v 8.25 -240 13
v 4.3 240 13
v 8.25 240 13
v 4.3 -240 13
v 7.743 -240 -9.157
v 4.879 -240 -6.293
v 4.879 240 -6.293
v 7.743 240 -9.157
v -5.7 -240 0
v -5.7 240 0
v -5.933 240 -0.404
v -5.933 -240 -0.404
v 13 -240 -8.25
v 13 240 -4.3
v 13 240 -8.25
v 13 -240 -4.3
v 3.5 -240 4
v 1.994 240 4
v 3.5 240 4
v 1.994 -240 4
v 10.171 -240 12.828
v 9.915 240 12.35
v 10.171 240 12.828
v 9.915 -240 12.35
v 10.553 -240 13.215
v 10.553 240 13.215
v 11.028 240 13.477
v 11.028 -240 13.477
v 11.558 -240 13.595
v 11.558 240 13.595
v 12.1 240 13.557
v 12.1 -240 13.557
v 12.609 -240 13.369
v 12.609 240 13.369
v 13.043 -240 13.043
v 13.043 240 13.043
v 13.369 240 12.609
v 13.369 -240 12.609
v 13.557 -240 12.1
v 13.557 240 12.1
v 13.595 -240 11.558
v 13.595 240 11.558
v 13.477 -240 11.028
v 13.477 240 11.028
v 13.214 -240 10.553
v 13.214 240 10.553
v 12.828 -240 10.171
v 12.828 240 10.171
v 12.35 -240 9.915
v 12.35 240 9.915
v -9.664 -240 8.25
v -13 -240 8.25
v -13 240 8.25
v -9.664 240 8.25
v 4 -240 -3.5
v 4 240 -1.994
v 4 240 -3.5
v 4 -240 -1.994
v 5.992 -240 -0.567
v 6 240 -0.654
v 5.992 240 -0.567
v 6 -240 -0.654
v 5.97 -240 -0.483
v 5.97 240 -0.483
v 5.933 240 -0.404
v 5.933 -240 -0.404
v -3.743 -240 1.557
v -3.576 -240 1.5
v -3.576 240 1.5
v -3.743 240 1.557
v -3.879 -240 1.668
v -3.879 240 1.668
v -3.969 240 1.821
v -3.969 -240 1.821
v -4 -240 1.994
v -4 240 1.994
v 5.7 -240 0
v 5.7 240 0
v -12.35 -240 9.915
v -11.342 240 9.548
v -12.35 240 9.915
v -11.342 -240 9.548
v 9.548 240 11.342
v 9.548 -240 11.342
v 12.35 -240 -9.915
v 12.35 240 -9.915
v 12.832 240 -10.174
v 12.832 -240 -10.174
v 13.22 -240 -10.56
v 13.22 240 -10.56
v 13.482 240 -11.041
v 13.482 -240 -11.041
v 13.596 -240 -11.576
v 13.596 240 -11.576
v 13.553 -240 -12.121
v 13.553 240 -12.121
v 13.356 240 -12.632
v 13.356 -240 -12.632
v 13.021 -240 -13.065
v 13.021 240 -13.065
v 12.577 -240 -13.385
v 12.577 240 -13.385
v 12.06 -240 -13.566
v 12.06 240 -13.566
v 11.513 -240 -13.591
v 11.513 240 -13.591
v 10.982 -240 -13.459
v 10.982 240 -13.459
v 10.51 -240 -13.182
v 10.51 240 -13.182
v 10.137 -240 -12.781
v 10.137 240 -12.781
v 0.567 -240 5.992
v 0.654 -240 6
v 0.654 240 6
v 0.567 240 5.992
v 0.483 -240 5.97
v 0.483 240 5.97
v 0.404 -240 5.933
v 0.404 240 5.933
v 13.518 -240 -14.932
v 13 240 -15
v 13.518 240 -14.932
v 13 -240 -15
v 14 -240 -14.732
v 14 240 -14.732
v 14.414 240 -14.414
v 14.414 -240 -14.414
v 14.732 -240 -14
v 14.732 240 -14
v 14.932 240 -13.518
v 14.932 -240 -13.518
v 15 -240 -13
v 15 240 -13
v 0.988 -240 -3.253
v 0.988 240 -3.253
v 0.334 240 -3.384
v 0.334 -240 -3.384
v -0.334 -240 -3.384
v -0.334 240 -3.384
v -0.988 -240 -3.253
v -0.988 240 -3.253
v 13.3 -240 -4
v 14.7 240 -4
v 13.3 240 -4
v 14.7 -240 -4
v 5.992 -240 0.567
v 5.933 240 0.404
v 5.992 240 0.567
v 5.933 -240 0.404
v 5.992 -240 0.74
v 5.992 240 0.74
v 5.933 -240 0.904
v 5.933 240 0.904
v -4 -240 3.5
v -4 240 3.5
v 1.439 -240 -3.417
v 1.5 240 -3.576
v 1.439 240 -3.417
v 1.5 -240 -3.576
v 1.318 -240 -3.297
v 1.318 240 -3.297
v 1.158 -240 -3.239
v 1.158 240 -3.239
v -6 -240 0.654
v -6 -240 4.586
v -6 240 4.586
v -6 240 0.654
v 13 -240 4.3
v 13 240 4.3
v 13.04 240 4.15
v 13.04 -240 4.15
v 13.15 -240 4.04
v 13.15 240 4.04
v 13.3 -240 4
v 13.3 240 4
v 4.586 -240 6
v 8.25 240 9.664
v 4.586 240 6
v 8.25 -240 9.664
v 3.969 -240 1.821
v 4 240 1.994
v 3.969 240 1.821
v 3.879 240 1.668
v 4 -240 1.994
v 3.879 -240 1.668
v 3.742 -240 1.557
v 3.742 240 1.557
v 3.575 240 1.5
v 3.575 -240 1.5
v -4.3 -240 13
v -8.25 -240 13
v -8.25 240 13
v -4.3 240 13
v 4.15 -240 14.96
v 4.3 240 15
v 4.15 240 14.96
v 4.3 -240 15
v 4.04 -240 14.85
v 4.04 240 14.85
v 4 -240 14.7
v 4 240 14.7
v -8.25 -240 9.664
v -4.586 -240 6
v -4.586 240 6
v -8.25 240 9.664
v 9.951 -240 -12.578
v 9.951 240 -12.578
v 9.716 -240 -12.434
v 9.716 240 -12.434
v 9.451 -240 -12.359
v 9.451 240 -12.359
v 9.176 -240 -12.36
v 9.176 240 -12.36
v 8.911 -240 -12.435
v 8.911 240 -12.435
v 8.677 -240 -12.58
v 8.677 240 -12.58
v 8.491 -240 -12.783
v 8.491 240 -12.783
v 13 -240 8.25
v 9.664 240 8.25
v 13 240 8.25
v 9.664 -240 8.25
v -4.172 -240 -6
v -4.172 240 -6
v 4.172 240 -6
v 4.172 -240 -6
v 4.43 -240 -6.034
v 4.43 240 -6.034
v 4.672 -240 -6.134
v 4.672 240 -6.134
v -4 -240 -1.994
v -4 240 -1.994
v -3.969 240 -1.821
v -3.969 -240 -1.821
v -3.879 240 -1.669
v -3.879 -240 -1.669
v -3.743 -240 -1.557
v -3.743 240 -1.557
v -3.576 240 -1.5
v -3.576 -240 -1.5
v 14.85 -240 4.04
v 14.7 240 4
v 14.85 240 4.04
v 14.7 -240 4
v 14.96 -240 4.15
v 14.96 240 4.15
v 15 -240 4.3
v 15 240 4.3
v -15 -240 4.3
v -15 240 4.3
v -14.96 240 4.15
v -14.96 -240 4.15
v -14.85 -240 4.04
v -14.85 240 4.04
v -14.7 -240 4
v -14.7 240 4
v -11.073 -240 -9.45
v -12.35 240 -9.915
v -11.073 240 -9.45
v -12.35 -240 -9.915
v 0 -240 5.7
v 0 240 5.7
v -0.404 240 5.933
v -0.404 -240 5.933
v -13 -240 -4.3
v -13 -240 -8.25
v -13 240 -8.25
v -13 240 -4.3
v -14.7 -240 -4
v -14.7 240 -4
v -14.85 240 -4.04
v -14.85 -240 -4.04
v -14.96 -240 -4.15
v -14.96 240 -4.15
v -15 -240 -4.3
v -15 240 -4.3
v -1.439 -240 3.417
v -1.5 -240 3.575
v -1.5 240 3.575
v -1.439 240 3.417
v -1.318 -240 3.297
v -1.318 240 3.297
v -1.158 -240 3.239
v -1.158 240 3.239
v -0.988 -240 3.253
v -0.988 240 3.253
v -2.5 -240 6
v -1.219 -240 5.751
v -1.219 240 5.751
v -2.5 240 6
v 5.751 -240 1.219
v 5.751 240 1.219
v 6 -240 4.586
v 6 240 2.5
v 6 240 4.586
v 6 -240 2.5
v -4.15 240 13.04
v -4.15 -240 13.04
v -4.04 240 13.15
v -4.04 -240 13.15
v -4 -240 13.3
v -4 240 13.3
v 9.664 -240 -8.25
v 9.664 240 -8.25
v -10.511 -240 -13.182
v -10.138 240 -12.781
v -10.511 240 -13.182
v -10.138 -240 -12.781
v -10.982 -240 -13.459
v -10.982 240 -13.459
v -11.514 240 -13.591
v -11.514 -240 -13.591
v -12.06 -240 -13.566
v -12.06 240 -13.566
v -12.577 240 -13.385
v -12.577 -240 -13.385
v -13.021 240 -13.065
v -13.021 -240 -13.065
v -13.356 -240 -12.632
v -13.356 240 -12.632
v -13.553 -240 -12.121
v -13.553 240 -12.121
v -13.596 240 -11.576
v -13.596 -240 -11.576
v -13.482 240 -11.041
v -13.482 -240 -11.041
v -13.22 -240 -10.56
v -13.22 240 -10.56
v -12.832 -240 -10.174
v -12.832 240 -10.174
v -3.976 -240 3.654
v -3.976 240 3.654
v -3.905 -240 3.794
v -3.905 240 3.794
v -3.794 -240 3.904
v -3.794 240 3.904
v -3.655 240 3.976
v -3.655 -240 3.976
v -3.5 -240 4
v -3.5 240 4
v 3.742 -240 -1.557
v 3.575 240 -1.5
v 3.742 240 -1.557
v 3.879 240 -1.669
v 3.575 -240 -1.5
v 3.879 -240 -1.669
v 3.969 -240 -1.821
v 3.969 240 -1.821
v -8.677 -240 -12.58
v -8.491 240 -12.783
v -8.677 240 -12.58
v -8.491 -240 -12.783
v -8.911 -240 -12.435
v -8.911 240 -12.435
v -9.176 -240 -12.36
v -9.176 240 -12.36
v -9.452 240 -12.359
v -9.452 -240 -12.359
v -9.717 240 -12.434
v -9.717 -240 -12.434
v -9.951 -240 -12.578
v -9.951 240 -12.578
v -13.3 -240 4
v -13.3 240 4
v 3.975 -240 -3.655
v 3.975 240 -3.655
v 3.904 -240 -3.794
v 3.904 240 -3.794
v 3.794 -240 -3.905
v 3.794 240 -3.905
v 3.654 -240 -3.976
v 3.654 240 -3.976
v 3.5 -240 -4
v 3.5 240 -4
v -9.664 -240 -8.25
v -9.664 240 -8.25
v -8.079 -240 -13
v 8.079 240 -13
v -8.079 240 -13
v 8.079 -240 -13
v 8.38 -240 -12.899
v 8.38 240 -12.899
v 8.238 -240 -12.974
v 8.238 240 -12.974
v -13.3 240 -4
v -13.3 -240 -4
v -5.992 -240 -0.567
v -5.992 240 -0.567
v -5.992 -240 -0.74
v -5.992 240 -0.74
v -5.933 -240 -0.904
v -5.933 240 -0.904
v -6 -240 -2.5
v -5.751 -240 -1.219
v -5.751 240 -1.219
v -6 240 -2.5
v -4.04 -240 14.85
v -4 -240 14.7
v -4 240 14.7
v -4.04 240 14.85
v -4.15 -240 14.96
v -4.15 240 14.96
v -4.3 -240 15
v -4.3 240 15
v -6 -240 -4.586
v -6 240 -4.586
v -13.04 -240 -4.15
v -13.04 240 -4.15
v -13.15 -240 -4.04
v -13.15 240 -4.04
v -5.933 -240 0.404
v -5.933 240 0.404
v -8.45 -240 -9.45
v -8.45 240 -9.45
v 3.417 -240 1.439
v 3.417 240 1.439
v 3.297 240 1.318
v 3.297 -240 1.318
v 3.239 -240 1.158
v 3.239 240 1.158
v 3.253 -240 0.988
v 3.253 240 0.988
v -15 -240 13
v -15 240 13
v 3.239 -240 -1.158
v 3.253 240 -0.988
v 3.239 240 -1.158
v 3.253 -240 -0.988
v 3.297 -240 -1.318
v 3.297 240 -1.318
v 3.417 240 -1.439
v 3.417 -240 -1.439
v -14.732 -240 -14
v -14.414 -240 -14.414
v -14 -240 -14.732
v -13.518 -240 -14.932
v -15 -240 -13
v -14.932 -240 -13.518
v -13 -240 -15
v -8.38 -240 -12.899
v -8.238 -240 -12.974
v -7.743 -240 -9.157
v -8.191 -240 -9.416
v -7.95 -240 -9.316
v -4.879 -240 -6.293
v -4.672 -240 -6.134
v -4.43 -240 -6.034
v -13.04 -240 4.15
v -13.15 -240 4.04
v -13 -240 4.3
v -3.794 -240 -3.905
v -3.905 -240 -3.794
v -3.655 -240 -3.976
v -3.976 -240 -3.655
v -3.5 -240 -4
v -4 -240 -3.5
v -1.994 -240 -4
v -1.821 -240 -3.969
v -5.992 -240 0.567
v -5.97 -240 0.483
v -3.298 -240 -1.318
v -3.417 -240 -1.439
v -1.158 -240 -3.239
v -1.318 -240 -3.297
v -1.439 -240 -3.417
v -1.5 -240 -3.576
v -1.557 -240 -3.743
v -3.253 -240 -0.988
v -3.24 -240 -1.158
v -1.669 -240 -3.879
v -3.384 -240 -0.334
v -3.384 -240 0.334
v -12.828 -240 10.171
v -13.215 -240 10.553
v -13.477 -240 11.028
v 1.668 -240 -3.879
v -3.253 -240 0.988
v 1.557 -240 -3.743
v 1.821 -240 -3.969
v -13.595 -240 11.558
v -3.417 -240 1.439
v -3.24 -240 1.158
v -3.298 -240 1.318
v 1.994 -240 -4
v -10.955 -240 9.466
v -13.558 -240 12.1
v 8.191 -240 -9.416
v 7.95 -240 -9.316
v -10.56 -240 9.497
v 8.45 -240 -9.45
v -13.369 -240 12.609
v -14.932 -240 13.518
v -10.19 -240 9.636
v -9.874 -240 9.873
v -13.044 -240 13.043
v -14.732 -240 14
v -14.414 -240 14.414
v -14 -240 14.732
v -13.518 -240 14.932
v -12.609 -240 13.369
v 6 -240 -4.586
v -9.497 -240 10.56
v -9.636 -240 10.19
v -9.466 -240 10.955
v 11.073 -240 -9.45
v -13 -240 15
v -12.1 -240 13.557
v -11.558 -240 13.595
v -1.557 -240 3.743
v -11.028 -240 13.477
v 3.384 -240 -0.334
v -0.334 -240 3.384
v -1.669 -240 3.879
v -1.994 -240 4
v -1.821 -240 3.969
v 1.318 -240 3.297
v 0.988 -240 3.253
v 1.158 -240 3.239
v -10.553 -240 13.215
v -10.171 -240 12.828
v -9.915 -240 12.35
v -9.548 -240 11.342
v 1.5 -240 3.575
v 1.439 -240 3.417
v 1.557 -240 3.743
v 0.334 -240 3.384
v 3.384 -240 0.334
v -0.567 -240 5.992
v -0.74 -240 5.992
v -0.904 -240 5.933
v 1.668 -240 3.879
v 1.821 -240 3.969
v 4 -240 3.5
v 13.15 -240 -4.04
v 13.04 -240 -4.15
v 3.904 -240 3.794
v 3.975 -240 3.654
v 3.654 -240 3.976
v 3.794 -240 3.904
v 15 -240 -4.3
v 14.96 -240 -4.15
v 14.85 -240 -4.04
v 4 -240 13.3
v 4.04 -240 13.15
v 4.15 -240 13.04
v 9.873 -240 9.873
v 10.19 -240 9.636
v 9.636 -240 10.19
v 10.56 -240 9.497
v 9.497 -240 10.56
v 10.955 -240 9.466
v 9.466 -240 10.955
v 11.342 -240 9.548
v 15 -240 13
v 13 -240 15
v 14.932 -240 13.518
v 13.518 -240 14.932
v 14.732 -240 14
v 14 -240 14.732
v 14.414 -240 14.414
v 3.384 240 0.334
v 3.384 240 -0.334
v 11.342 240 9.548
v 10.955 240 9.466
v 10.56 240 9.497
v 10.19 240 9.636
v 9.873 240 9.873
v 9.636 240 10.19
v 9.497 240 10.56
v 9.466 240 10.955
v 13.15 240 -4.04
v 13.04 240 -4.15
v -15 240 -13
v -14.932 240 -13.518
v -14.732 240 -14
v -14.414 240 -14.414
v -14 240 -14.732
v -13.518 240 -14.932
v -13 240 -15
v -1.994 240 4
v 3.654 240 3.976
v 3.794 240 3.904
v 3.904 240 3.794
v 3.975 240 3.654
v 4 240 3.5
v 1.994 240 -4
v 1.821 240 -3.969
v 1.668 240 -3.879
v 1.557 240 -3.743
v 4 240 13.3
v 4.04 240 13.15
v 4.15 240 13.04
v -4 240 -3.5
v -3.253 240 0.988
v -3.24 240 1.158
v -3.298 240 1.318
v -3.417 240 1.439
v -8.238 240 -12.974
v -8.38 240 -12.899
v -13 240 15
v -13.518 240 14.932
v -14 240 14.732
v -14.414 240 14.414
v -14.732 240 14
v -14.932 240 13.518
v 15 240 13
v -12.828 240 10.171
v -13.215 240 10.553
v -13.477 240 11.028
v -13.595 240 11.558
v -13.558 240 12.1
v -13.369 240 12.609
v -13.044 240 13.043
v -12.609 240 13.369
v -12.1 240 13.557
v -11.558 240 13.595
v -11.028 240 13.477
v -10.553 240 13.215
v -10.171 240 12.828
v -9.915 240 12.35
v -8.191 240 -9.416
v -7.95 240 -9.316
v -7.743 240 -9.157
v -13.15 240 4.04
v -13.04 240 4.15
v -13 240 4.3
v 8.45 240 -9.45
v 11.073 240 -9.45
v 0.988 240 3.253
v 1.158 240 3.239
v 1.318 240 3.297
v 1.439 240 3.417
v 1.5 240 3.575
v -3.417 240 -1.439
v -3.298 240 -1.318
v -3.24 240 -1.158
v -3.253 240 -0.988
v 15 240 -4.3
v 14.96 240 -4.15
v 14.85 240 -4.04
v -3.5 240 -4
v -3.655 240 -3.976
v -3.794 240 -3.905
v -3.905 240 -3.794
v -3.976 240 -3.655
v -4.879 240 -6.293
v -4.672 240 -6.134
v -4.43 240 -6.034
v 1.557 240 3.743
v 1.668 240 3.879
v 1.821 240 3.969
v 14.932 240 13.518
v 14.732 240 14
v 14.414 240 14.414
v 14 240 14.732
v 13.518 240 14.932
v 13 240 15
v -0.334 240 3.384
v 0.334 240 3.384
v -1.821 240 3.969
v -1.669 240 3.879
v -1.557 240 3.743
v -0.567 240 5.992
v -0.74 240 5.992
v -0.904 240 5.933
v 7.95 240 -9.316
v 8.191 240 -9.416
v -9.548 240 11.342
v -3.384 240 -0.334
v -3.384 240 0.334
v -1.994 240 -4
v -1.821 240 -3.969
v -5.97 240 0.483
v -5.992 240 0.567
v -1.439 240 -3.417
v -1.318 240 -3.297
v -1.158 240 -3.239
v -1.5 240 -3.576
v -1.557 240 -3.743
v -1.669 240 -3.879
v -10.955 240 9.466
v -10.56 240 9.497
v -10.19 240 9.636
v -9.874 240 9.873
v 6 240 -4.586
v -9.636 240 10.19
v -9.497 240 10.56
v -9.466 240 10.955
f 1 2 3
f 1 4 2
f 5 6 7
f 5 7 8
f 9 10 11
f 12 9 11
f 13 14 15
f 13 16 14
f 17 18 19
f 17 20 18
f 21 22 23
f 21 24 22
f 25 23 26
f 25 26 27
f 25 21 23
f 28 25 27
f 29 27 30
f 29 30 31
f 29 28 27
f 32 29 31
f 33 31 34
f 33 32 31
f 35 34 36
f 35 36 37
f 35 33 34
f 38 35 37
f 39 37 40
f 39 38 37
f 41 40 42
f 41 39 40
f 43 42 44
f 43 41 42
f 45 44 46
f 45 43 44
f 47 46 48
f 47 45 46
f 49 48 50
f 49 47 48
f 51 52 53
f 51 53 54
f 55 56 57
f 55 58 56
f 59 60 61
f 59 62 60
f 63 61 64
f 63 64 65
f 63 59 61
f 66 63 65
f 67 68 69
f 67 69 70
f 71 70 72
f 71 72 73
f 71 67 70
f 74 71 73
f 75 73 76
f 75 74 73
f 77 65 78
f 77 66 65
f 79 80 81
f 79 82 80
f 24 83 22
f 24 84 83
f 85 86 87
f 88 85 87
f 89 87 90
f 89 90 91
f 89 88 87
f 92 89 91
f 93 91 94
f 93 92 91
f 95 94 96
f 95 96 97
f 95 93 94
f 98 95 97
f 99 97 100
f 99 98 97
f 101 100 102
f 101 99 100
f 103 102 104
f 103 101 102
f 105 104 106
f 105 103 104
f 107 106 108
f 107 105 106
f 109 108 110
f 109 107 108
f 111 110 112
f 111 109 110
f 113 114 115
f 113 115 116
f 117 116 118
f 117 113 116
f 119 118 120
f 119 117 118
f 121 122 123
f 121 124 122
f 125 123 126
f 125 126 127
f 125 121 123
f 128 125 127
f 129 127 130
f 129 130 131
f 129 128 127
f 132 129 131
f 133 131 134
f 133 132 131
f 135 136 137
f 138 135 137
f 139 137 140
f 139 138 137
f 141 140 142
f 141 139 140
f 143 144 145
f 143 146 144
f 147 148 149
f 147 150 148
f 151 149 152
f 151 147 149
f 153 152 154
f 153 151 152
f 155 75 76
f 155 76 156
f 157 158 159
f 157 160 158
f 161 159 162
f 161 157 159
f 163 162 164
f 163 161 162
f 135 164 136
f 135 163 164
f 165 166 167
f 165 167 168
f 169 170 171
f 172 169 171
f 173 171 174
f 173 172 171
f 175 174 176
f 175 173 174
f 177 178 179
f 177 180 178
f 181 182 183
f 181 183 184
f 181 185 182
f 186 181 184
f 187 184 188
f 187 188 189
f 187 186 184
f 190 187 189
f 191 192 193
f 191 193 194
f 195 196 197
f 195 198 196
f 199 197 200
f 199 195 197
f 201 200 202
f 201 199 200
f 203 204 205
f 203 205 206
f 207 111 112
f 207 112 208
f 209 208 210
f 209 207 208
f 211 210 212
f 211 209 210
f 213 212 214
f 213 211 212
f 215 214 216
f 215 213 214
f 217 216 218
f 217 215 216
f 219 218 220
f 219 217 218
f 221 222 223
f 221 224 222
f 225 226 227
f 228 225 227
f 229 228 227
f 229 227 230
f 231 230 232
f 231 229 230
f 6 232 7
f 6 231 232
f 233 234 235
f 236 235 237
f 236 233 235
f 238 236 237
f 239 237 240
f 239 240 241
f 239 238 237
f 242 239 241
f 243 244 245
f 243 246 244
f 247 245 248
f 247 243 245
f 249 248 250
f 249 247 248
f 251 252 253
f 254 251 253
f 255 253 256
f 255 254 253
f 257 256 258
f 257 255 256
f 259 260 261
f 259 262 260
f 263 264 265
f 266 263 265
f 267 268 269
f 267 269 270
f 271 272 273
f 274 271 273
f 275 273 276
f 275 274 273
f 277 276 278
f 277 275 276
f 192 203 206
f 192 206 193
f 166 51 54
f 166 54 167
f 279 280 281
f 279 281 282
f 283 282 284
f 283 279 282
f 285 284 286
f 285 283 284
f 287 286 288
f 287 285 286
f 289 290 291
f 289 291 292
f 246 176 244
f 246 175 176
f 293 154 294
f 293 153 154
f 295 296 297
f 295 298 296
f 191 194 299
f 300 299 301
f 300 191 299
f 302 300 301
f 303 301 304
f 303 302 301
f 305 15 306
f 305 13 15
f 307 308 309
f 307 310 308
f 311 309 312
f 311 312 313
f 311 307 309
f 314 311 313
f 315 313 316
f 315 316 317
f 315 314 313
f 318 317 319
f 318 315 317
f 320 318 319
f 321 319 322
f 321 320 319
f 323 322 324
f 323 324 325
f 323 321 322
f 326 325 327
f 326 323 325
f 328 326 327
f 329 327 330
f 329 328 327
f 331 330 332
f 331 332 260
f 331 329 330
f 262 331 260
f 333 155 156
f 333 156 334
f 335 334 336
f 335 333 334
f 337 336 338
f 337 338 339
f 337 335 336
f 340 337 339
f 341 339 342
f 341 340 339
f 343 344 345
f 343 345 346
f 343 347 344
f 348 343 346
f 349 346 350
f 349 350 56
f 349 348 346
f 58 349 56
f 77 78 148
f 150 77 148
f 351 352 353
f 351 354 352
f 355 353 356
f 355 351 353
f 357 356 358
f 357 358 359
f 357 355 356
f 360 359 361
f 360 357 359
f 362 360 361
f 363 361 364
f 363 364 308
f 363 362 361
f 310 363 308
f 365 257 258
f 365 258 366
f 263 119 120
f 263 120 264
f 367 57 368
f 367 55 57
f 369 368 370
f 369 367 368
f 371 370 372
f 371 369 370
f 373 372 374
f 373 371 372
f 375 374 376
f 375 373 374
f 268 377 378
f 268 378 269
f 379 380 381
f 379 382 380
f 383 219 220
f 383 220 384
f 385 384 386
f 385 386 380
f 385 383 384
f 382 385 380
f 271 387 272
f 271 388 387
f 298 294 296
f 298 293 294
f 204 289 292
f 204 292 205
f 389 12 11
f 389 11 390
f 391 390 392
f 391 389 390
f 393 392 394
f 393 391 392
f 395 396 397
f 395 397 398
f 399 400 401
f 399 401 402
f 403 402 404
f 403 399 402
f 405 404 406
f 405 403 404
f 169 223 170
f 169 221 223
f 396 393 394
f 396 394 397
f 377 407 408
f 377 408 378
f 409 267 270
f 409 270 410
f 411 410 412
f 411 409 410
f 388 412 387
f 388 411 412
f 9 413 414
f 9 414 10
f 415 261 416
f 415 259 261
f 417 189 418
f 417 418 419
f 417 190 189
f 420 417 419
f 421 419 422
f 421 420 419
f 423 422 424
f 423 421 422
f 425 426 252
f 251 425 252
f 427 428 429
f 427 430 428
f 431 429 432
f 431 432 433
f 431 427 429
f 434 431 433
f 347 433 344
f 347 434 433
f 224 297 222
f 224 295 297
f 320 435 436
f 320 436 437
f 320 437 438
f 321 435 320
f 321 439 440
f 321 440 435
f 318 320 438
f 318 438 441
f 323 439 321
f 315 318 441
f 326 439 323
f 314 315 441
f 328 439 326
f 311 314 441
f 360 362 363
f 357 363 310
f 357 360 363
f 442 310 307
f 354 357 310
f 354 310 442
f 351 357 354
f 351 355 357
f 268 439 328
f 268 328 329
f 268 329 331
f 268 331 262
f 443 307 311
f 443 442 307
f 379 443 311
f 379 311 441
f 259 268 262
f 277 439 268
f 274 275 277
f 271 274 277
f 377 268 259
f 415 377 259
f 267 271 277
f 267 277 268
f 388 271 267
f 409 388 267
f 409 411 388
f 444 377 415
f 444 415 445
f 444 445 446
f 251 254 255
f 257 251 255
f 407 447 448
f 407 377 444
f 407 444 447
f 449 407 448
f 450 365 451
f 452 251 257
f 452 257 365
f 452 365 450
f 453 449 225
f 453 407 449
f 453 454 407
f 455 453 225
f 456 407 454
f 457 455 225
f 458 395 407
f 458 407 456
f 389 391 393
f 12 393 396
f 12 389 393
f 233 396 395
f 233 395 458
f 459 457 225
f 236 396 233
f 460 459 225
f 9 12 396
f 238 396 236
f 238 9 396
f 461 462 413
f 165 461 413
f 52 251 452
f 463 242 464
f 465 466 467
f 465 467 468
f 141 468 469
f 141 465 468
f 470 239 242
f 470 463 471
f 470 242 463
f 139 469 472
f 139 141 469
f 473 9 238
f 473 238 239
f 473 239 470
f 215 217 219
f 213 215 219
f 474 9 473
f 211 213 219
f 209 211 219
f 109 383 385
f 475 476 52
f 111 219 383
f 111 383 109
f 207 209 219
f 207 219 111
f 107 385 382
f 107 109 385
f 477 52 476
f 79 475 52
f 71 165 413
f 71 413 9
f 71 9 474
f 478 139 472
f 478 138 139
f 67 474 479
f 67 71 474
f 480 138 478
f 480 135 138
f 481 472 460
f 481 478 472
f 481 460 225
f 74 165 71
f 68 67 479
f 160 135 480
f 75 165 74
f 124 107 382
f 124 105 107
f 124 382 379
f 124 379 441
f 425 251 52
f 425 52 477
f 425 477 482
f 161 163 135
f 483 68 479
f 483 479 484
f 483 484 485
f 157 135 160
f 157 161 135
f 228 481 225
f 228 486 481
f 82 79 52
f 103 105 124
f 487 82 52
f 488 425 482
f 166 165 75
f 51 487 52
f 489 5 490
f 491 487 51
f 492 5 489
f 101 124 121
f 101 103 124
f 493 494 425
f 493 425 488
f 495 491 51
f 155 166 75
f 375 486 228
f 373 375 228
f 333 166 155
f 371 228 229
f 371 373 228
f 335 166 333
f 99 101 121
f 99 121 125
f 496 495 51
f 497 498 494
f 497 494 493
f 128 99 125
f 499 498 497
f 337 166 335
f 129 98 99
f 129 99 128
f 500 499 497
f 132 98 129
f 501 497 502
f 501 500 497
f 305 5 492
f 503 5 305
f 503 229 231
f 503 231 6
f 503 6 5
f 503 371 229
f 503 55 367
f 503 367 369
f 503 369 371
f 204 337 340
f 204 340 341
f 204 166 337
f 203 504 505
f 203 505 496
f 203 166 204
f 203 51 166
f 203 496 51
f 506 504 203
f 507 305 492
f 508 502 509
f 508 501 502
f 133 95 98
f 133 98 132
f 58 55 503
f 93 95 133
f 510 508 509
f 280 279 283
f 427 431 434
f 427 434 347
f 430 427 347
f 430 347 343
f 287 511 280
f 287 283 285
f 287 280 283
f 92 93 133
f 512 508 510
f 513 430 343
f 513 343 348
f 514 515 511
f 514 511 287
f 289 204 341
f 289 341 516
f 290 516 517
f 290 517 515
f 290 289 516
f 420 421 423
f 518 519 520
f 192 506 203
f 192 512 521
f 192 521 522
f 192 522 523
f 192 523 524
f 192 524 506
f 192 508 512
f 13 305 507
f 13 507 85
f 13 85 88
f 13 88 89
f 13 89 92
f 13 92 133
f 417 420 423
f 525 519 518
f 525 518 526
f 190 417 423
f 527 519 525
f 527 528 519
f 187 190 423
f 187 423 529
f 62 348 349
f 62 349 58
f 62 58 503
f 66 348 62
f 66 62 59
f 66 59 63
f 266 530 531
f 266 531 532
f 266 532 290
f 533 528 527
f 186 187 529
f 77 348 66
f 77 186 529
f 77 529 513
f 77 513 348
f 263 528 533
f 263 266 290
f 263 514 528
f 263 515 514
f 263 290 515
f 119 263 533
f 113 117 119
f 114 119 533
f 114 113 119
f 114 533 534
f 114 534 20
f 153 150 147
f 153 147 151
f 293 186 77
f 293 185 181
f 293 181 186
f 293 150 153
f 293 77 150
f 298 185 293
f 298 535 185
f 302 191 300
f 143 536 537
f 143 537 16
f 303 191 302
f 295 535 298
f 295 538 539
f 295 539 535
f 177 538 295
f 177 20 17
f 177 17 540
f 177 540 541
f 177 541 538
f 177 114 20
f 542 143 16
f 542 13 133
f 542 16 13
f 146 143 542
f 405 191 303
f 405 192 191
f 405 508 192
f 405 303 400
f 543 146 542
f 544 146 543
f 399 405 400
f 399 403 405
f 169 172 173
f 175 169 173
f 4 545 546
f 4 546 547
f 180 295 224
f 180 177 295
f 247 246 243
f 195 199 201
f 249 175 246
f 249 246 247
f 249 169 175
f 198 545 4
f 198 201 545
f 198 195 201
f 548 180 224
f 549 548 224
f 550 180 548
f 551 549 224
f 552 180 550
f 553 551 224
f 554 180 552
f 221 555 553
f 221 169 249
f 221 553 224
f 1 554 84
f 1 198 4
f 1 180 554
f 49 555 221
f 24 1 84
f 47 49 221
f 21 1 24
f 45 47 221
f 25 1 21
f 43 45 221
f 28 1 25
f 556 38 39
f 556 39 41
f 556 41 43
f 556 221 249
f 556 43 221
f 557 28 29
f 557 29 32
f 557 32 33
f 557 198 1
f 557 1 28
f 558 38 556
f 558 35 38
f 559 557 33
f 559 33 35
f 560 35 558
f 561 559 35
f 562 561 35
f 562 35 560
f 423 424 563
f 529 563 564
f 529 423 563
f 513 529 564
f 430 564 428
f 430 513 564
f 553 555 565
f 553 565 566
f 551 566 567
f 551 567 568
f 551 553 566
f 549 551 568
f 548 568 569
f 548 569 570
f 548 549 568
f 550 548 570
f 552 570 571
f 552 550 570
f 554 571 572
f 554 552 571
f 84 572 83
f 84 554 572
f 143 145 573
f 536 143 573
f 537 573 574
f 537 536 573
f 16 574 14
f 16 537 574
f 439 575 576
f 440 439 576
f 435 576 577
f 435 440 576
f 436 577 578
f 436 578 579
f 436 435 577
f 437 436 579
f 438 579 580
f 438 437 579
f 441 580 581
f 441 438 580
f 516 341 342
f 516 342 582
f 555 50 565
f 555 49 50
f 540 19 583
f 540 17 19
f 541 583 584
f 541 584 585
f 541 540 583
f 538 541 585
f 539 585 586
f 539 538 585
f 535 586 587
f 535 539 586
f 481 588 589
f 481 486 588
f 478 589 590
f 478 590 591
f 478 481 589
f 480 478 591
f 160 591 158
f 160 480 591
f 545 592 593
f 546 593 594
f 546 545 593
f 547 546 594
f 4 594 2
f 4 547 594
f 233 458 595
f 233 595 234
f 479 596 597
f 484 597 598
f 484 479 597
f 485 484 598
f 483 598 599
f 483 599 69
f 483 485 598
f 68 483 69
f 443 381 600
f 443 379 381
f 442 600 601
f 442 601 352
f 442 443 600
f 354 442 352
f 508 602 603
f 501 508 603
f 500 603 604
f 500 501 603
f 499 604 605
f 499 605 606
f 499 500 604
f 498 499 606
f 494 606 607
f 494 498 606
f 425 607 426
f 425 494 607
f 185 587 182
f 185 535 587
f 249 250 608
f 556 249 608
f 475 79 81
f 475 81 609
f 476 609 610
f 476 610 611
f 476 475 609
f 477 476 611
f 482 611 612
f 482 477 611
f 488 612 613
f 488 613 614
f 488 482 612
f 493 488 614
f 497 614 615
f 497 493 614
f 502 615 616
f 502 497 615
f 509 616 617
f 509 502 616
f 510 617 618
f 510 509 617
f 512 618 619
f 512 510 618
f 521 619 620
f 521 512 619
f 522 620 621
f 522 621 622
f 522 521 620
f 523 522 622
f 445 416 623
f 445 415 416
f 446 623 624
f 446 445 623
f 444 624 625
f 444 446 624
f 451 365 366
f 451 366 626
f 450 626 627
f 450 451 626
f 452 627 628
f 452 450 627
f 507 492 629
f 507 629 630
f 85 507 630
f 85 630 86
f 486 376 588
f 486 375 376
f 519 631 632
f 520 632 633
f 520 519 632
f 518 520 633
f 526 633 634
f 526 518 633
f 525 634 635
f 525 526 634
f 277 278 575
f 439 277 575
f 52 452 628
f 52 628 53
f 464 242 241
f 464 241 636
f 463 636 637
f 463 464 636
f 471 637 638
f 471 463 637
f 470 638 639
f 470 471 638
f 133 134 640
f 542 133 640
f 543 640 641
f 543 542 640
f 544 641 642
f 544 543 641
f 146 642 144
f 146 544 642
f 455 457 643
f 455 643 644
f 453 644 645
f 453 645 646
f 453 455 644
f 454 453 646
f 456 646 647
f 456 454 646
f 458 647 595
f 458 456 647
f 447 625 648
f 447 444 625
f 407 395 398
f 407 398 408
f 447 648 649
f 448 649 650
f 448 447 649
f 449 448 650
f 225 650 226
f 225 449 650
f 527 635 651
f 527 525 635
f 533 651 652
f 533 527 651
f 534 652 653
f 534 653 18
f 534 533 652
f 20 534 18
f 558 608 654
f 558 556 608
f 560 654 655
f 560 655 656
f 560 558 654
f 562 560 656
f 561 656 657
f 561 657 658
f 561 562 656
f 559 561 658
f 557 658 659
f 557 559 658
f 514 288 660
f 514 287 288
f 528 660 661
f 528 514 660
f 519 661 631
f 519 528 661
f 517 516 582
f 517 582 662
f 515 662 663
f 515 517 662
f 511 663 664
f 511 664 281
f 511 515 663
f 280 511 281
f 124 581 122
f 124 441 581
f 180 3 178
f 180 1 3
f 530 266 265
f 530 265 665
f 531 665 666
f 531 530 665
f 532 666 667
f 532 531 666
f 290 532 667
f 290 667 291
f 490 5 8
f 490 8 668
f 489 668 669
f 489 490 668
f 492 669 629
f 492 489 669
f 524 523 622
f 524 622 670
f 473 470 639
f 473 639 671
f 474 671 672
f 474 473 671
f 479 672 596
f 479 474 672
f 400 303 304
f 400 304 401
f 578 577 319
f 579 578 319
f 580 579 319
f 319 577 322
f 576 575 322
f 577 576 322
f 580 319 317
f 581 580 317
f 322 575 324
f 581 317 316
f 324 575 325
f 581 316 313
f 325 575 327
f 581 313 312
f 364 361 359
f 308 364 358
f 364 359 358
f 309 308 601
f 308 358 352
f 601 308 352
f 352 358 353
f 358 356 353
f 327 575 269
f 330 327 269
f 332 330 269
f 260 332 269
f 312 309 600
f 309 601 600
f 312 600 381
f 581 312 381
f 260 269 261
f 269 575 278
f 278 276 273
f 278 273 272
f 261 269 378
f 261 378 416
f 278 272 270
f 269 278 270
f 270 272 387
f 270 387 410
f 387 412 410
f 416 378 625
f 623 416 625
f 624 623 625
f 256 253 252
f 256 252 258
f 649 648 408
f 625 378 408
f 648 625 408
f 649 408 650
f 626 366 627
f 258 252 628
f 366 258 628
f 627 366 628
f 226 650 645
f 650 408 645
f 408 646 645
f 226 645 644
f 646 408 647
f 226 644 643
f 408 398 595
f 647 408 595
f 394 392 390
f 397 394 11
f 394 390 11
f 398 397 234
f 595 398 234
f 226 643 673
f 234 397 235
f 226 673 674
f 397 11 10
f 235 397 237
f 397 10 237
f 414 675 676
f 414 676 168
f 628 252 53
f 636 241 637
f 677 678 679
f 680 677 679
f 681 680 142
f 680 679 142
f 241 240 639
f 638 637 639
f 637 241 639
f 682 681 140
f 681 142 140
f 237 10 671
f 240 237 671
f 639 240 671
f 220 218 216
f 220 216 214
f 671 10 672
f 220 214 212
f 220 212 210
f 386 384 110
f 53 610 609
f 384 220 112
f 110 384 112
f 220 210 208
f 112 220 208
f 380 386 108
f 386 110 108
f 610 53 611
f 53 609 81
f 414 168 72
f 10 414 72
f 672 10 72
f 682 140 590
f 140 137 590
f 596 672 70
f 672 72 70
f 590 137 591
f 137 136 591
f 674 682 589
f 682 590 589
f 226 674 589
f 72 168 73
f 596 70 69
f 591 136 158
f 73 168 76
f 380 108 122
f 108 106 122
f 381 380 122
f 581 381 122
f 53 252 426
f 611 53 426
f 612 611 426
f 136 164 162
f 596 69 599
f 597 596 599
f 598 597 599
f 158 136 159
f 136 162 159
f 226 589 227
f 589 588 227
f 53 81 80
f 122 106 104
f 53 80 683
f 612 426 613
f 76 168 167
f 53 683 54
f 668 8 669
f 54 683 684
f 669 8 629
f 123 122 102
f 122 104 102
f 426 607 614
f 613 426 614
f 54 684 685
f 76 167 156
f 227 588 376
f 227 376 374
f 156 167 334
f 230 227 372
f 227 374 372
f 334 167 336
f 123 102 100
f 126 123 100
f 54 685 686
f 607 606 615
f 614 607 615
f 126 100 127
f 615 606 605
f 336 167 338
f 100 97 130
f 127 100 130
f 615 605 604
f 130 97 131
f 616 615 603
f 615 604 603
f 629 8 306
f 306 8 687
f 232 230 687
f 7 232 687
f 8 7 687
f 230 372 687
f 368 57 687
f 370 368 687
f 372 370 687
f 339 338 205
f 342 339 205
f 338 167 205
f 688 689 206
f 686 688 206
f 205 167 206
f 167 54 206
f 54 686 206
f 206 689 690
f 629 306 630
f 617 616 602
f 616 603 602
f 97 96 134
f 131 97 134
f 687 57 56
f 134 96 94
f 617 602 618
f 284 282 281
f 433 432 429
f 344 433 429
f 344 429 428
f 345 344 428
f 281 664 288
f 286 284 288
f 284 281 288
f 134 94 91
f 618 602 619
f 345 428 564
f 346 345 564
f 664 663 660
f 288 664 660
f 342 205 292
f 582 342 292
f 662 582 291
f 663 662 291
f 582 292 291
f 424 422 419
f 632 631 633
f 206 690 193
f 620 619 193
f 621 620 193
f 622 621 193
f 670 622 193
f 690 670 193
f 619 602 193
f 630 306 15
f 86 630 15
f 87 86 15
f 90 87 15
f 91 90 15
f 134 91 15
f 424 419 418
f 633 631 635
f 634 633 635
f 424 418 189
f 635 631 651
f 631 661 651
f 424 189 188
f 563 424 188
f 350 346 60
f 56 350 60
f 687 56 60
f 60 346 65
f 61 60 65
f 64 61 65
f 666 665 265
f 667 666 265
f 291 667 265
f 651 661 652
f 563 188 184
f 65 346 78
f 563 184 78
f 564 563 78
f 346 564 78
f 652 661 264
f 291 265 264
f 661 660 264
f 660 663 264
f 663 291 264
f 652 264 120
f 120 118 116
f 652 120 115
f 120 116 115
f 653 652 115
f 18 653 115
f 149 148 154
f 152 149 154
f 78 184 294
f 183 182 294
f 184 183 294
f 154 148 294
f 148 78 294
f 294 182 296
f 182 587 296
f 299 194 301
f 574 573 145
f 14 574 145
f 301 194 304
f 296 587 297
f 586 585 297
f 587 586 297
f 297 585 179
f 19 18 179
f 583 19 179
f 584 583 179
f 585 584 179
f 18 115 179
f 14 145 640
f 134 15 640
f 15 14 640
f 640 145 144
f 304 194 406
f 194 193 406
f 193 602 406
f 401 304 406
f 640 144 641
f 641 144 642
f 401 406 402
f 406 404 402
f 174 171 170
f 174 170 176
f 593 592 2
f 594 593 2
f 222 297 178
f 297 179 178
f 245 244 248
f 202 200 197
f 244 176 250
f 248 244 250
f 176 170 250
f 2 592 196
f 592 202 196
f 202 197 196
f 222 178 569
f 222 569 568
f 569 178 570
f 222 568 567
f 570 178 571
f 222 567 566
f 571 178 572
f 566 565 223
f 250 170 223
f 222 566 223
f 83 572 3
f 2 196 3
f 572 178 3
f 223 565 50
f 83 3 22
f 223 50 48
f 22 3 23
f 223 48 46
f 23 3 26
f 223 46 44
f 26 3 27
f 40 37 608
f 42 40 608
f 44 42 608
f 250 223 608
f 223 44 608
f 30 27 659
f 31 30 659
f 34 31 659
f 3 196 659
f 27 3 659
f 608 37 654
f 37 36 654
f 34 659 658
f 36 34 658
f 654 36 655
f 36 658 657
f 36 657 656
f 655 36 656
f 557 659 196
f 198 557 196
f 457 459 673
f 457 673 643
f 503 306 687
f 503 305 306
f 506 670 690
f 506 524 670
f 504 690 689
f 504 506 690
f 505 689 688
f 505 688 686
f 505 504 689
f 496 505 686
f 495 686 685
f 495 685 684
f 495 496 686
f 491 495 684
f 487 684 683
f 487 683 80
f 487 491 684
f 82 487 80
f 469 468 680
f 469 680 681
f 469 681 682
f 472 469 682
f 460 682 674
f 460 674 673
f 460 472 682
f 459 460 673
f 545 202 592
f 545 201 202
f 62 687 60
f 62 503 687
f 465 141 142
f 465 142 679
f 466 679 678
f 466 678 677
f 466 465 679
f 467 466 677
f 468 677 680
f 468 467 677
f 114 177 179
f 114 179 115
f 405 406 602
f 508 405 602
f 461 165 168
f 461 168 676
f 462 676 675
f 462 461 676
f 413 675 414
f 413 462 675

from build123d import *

# Parameters (mm, degrees)
F2_DEPTH = 240


# Not quite as in the source:
# - ends of sketch curves that miss each other by under 0.0002 mm in the source are joined


with BuildPart() as f2:
    # F1 (on Front) → F2 (new body, symmetric)
    with BuildSketch(Plane.XZ):
        with BuildLine():
            Line((8.249944, 9.6642), (4.58573, 5.999986))
            Line((4.58573, 5.999986), (0.653534, 5.999986))
            ThreePointArc((0.653534, 5.999986), (0.5241245494, 5.9829489324), (0.4035341291, 5.9329987764))
            Line((0.4035341291, 5.9329987764), (-5.6e-05, 5.699986))
            Line((-5.6e-05, 5.699986), (-0.403646, 5.932999))
            ThreePointArc((-0.403646, 5.932999), (-0.653646, 5.999986), (-0.9036458709, 5.9329987764))
            Line((-0.9036458709, 5.9329987764), (-1.218942, 5.750963))
            Line((-1.218942, 5.750963), (-2.500056, 5.999986))
            Line((-2.500056, 5.999986), (-4.585842, 5.999986))
            Line((-4.585842, 5.999986), (-8.250056, 9.6642))
            Line((-8.250056, 9.6642), (-8.250056, 12.999986))
            Line((-8.250056, 12.999986), (-4.300056, 12.999986))
            ThreePointArc((-4.300056, 12.999986), (-4.0879239656, 13.0878539656), (-4.000056, 13.299986))
            Line((-4.000056, 13.299986), (-4.000056, 14.699986))
            ThreePointArc((-4.000056, 14.699986), (-4.0879239656, 14.9121180344), (-4.300056, 14.999986))
            Line((-4.300056, 14.999986), (-13.000056, 14.999986))
            ThreePointArc((-13.000056, 14.999986), (-14.4142695624, 14.4141995624), (-15.000056, 12.999986))
            Line((-15.000056, 12.999986), (-15.000056, 4.299986))
            ThreePointArc((-15.000056, 4.299986), (-14.9121880344, 4.0878539656), (-14.700056, 3.999986))
            Line((-14.700056, 3.999986), (-13.300056, 3.999986))
            ThreePointArc((-13.300056, 3.999986), (-13.0879239656, 4.0878539656), (-13.000056, 4.299986))
            Line((-13.000056, 4.299986), (-13.000056, 8.249986))
            Line((-13.000056, 8.249986), (-9.66427, 8.249986))
            Line((-9.66427, 8.249986), (-6.000056, 4.585772))
            Line((-6.000056, 4.585772), (-6.000056, 0.653576))
            ThreePointArc((-6.000056, 0.653576), (-5.9830189324, 0.5241665494), (-5.9330687764, 0.4035761291))
            Line((-5.9330687764, 0.4035761291), (-5.700056, -1.4e-05))
            Line((-5.700056, -1.4e-05), (-5.933069, -0.403604))
            ThreePointArc((-5.933069, -0.403604), (-6.000056, -0.653604), (-5.9330687764, -0.9036038709))
            Line((-5.9330687764, -0.9036038709), (-5.751033, -1.2189))
            Line((-5.751033, -1.2189), (-6.000056, -2.500014))
            Line((-6.000056, -2.500014), (-6.000056, -4.5858))
            Line((-6.000056, -4.5858), (-9.66427, -8.250014))
            Line((-9.66427, -8.250014), (-13.000056, -8.250014))
            Line((-13.000056, -8.250014), (-13.000056, -4.300014))
            ThreePointArc((-13.000056, -4.300014), (-13.0879239656, -4.0878819656), (-13.300056, -4.000014))
            Line((-13.300056, -4.000014), (-14.700056, -4.000014))
            ThreePointArc((-14.700056, -4.000014), (-14.9121880344, -4.0878819656), (-15.000056, -4.300014))
            Line((-15.000056, -4.300014), (-15.000056, -13.000014))
            ThreePointArc((-15.000056, -13.000014), (-14.4142695624, -14.4142275624), (-13.000056, -15.000014))
            Line((-13.000056, -15.000014), (12.999944, -15.000014))
            ThreePointArc((12.999944, -15.000014), (14.4141575624, -14.4142275624), (14.999944, -13.000014))
            Line((14.999944, -13.000014), (14.999944, -4.300014))
            ThreePointArc((14.999944, -4.300014), (14.9120760344, -4.0878819656), (14.699944, -4.000014))
            Line((14.699944, -4.000014), (13.299944, -4.000014))
            ThreePointArc((13.299944, -4.000014), (13.0878119656, -4.0878819656), (12.999944, -4.300014))
            Line((12.999944, -4.300014), (12.999944, -8.250014))
            Line((12.999944, -8.250014), (9.664158, -8.250014))
            Line((9.664158, -8.250014), (5.999944, -4.5858))
            Line((5.999944, -4.5858), (5.999944, -0.653604))
            ThreePointArc((5.999944, -0.653604), (5.9829069324, -0.5241945494), (5.9329567764, -0.4036041291))
            Line((5.9329567764, -0.4036041291), (5.699944, -1.4e-05))
            Line((5.699944, -1.4e-05), (5.932957, 0.403576))
            ThreePointArc((5.932957, 0.403576), (5.999944, 0.653576), (5.9329567764, 0.9035758709))
            Line((5.9329567764, 0.9035758709), (5.750921, 1.218872))
            Line((5.750921, 1.218872), (5.999944, 2.499986))
            Line((5.999944, 2.499986), (5.999944, 4.585772))
            Line((5.999944, 4.585772), (9.664158, 8.249986))
            Line((9.664158, 8.249986), (12.999944, 8.249986))
            Line((12.999944, 8.249986), (12.999944, 4.299986))
            ThreePointArc((12.999944, 4.299986), (13.0878119656, 4.0878539656), (13.299944, 3.999986))
            Line((13.299944, 3.999986), (14.699944, 3.999986))
            ThreePointArc((14.699944, 3.999986), (14.9120760344, 4.0878539656), (14.999944, 4.299986))
            Line((14.999944, 4.299986), (14.999944, 12.999986))
            ThreePointArc((14.999944, 12.999986), (14.4141575624, 14.4141995624), (12.999944, 14.999986))
            Line((12.999944, 14.999986), (4.299944, 14.999986))
            ThreePointArc((4.299944, 14.999986), (4.0878119656, 14.9121180344), (3.999944, 14.699986))
            Line((3.999944, 14.699986), (3.999944, 13.299986))
            ThreePointArc((3.999944, 13.299986), (4.0878119656, 13.0878539656), (4.299944, 12.999986))
            Line((4.299944, 12.999986), (8.249944, 12.999986))
            Line((8.249944, 12.999986), (8.249944, 9.6642))
        make_face()
        with BuildLine():
            Line((-4.171629, -6.000014), (4.171517, -6.000014))
            ThreePointArc((4.171517, -6.000014), (4.5542004324, -6.0761344675), (4.8786237812, -6.2929072188))
            Line((4.8786237812, -6.2929072188), (7.742837, -9.157121))
            ThreePointArc((7.742837, -9.157121), (8.0672605676, -9.3738935325), (8.449944, -9.450014))
            Line((8.449944, -9.450014), (11.073348, -9.450014))
            Line((11.073348, -9.450014), (12.349782, -9.914598))
            ThreePointArc((12.349782, -9.914598), (13.2040603505, -12.8608903949), (10.1374570291, -12.7810479799))
            ThreePointArc((10.1374570291, -12.7810479799), (9.3136995047, -12.3500149751), (8.4911490608, -12.7833470418))
            ThreePointArc((8.4911490608, -12.7833470418), (8.3119125635, -12.9425444809), (8.079175, -13.000014))
            Line((8.079175, -13.000014), (-8.079287, -13.000014))
            ThreePointArc((-8.079287, -13.000014), (-8.3120245635, -12.9425444809), (-8.4912608636, -12.7833469062))
            ThreePointArc((-8.4912608636, -12.7833469062), (-9.3138115047, -12.3500149751), (-10.1375690315, -12.7810479782))
            ThreePointArc((-10.1375690315, -12.7810479782), (-13.2041723505, -12.8608903949), (-12.3498940253, -9.9145979306))
            Line((-12.3498940253, -9.9145979306), (-11.07346, -9.450014))
            Line((-11.07346, -9.450014), (-8.450056, -9.450014))
            ThreePointArc((-8.450056, -9.450014), (-8.0673725676, -9.3738935325), (-7.7429492188, -9.1571207812))
            Line((-7.7429492188, -9.1571207812), (-4.878736, -6.292907))
            ThreePointArc((-4.878736, -6.292907), (-4.5543124324, -6.0761344675), (-4.171629, -6.000014))
        make_face(mode=Mode.SUBTRACT)
        with BuildLine():
            ThreePointArc((-12.3498940253, 9.9145699306), (-13.0435588843, 13.0434888843), (-9.9146399306, 12.3498240253))
            Line((-9.9146399306, 12.3498240253), (-9.547908, 11.342236))
            ThreePointArc((-9.547908, 11.342236), (-9.8735275063, 9.8734575063), (-11.3423061215, 9.5478376661))
            Line((-11.3423061215, 9.5478376661), (-12.3498940253, 9.9145699306))
        make_face(mode=Mode.SUBTRACT)
        with BuildLine():
            ThreePointArc((0.9882629956, -3.2532009855), (-5.6e-05, -3.400014), (-0.9883749956, -3.2532009855))
            ThreePointArc((-0.9883749956, -3.2532009855), (-1.3178396431, -3.2974811593), (-1.5000564258, -3.5755229349))
            ThreePointArc((-1.5000564258, -3.5755229349), (-1.6685571025, -3.8793255231), (-1.994322, -4.000014))
            Line((-1.994322, -4.000014), (-3.500056, -4.000014))
            ThreePointArc((-3.500056, -4.000014), (-3.8536093906, -3.8535673906), (-4.000056, -3.500014))
            Line((-4.000056, -3.500014), (-4.000056, -1.99428))
            ThreePointArc((-4.000056, -1.99428), (-3.8793675231, -1.6685151025), (-3.5755649263, -1.5000144822))
            ThreePointArc((-3.5755649263, -1.5000144822), (-3.2975231593, -1.3177976431), (-3.2532441585, -0.9883290481))
            ThreePointArc((-3.2532441585, -0.9883290481), (-3.400056, -1.4e-05), (-3.2532429855, 0.9883049956))
            ThreePointArc((-3.2532429855, 0.9883049956), (-3.2975231593, 1.3177696431), (-3.5755649349, 1.4999864258))
            ThreePointArc((-3.5755649349, 1.4999864258), (-3.8793675231, 1.6684871025), (-4.000056, 1.994252))
            Line((-4.000056, 1.994252), (-4.000056, 3.499986))
            ThreePointArc((-4.000056, 3.499986), (-3.8536093906, 3.8535393906), (-3.500056, 3.999986))
            Line((-3.500056, 3.999986), (-1.994322, 3.999986))
            ThreePointArc((-1.994322, 3.999986), (-1.6685571025, 3.8792975231), (-1.5000564822, 3.5754949263))
            ThreePointArc((-1.5000564822, 3.5754949263), (-1.3178396431, 3.2974531593), (-0.9883710481, 3.2531741585))
            ThreePointArc((-0.9883710481, 3.2531741585), (-5.6e-05, 3.399986), (0.9882629956, 3.2531729855))
            ThreePointArc((0.9882629956, 3.2531729855), (1.3177276431, 3.2974531593), (1.4999444258, 3.5754949349))
            ThreePointArc((1.4999444258, 3.5754949349), (1.6684451025, 3.8792975231), (1.99421, 3.999986))
            Line((1.99421, 3.999986), (3.499944, 3.999986))
            ThreePointArc((3.499944, 3.999986), (3.8534973906, 3.8535393906), (3.999944, 3.499986))
            Line((3.999944, 3.499986), (3.999944, 1.994252))
            ThreePointArc((3.999944, 1.994252), (3.8792555231, 1.6684871025), (3.5754529263, 1.4999864822))
            ThreePointArc((3.5754529263, 1.4999864822), (3.2974111593, 1.3177696431), (3.2531321585, 0.9883010481))
            ThreePointArc((3.2531321585, 0.9883010481), (3.399944, -1.4e-05), (3.2531309855, -0.9883329956))
            ThreePointArc((3.2531309855, -0.9883329956), (3.2974111593, -1.3177976431), (3.5754529349, -1.5000144258))
            ThreePointArc((3.5754529349, -1.5000144258), (3.8792555231, -1.6685151025), (3.999944, -1.99428))
            Line((3.999944, -1.99428), (3.999944, -3.500014))
            ThreePointArc((3.999944, -3.500014), (3.8534973906, -3.8535673906), (3.499944, -4.000014))
            Line((3.499944, -4.000014), (1.99421, -4.000014))
            ThreePointArc((1.99421, -4.000014), (1.6684451025, -3.8793255231), (1.4999444822, -3.5755229263))
            ThreePointArc((1.4999444822, -3.5755229263), (1.3177276431, -3.2974811593), (0.9882629956, -3.2532009855))
        make_face(mode=Mode.SUBTRACT)
        with BuildLine():
            ThreePointArc((11.3421941215, 9.5478376661), (9.8734155063, 9.8734575063), (9.5477956661, 11.3422361215))
            Line((9.5477956661, 11.3422361215), (9.914528, 12.349824))
            ThreePointArc((9.914528, 12.349824), (13.0434468843, 13.0434888843), (12.3497820253, 9.9145699306))
            Line((12.3497820253, 9.9145699306), (11.3421941215, 9.5478376661))
        make_face(mode=Mode.SUBTRACT)
    extrude(amount=F2_DEPTH, both=True)


solid = f2.part
